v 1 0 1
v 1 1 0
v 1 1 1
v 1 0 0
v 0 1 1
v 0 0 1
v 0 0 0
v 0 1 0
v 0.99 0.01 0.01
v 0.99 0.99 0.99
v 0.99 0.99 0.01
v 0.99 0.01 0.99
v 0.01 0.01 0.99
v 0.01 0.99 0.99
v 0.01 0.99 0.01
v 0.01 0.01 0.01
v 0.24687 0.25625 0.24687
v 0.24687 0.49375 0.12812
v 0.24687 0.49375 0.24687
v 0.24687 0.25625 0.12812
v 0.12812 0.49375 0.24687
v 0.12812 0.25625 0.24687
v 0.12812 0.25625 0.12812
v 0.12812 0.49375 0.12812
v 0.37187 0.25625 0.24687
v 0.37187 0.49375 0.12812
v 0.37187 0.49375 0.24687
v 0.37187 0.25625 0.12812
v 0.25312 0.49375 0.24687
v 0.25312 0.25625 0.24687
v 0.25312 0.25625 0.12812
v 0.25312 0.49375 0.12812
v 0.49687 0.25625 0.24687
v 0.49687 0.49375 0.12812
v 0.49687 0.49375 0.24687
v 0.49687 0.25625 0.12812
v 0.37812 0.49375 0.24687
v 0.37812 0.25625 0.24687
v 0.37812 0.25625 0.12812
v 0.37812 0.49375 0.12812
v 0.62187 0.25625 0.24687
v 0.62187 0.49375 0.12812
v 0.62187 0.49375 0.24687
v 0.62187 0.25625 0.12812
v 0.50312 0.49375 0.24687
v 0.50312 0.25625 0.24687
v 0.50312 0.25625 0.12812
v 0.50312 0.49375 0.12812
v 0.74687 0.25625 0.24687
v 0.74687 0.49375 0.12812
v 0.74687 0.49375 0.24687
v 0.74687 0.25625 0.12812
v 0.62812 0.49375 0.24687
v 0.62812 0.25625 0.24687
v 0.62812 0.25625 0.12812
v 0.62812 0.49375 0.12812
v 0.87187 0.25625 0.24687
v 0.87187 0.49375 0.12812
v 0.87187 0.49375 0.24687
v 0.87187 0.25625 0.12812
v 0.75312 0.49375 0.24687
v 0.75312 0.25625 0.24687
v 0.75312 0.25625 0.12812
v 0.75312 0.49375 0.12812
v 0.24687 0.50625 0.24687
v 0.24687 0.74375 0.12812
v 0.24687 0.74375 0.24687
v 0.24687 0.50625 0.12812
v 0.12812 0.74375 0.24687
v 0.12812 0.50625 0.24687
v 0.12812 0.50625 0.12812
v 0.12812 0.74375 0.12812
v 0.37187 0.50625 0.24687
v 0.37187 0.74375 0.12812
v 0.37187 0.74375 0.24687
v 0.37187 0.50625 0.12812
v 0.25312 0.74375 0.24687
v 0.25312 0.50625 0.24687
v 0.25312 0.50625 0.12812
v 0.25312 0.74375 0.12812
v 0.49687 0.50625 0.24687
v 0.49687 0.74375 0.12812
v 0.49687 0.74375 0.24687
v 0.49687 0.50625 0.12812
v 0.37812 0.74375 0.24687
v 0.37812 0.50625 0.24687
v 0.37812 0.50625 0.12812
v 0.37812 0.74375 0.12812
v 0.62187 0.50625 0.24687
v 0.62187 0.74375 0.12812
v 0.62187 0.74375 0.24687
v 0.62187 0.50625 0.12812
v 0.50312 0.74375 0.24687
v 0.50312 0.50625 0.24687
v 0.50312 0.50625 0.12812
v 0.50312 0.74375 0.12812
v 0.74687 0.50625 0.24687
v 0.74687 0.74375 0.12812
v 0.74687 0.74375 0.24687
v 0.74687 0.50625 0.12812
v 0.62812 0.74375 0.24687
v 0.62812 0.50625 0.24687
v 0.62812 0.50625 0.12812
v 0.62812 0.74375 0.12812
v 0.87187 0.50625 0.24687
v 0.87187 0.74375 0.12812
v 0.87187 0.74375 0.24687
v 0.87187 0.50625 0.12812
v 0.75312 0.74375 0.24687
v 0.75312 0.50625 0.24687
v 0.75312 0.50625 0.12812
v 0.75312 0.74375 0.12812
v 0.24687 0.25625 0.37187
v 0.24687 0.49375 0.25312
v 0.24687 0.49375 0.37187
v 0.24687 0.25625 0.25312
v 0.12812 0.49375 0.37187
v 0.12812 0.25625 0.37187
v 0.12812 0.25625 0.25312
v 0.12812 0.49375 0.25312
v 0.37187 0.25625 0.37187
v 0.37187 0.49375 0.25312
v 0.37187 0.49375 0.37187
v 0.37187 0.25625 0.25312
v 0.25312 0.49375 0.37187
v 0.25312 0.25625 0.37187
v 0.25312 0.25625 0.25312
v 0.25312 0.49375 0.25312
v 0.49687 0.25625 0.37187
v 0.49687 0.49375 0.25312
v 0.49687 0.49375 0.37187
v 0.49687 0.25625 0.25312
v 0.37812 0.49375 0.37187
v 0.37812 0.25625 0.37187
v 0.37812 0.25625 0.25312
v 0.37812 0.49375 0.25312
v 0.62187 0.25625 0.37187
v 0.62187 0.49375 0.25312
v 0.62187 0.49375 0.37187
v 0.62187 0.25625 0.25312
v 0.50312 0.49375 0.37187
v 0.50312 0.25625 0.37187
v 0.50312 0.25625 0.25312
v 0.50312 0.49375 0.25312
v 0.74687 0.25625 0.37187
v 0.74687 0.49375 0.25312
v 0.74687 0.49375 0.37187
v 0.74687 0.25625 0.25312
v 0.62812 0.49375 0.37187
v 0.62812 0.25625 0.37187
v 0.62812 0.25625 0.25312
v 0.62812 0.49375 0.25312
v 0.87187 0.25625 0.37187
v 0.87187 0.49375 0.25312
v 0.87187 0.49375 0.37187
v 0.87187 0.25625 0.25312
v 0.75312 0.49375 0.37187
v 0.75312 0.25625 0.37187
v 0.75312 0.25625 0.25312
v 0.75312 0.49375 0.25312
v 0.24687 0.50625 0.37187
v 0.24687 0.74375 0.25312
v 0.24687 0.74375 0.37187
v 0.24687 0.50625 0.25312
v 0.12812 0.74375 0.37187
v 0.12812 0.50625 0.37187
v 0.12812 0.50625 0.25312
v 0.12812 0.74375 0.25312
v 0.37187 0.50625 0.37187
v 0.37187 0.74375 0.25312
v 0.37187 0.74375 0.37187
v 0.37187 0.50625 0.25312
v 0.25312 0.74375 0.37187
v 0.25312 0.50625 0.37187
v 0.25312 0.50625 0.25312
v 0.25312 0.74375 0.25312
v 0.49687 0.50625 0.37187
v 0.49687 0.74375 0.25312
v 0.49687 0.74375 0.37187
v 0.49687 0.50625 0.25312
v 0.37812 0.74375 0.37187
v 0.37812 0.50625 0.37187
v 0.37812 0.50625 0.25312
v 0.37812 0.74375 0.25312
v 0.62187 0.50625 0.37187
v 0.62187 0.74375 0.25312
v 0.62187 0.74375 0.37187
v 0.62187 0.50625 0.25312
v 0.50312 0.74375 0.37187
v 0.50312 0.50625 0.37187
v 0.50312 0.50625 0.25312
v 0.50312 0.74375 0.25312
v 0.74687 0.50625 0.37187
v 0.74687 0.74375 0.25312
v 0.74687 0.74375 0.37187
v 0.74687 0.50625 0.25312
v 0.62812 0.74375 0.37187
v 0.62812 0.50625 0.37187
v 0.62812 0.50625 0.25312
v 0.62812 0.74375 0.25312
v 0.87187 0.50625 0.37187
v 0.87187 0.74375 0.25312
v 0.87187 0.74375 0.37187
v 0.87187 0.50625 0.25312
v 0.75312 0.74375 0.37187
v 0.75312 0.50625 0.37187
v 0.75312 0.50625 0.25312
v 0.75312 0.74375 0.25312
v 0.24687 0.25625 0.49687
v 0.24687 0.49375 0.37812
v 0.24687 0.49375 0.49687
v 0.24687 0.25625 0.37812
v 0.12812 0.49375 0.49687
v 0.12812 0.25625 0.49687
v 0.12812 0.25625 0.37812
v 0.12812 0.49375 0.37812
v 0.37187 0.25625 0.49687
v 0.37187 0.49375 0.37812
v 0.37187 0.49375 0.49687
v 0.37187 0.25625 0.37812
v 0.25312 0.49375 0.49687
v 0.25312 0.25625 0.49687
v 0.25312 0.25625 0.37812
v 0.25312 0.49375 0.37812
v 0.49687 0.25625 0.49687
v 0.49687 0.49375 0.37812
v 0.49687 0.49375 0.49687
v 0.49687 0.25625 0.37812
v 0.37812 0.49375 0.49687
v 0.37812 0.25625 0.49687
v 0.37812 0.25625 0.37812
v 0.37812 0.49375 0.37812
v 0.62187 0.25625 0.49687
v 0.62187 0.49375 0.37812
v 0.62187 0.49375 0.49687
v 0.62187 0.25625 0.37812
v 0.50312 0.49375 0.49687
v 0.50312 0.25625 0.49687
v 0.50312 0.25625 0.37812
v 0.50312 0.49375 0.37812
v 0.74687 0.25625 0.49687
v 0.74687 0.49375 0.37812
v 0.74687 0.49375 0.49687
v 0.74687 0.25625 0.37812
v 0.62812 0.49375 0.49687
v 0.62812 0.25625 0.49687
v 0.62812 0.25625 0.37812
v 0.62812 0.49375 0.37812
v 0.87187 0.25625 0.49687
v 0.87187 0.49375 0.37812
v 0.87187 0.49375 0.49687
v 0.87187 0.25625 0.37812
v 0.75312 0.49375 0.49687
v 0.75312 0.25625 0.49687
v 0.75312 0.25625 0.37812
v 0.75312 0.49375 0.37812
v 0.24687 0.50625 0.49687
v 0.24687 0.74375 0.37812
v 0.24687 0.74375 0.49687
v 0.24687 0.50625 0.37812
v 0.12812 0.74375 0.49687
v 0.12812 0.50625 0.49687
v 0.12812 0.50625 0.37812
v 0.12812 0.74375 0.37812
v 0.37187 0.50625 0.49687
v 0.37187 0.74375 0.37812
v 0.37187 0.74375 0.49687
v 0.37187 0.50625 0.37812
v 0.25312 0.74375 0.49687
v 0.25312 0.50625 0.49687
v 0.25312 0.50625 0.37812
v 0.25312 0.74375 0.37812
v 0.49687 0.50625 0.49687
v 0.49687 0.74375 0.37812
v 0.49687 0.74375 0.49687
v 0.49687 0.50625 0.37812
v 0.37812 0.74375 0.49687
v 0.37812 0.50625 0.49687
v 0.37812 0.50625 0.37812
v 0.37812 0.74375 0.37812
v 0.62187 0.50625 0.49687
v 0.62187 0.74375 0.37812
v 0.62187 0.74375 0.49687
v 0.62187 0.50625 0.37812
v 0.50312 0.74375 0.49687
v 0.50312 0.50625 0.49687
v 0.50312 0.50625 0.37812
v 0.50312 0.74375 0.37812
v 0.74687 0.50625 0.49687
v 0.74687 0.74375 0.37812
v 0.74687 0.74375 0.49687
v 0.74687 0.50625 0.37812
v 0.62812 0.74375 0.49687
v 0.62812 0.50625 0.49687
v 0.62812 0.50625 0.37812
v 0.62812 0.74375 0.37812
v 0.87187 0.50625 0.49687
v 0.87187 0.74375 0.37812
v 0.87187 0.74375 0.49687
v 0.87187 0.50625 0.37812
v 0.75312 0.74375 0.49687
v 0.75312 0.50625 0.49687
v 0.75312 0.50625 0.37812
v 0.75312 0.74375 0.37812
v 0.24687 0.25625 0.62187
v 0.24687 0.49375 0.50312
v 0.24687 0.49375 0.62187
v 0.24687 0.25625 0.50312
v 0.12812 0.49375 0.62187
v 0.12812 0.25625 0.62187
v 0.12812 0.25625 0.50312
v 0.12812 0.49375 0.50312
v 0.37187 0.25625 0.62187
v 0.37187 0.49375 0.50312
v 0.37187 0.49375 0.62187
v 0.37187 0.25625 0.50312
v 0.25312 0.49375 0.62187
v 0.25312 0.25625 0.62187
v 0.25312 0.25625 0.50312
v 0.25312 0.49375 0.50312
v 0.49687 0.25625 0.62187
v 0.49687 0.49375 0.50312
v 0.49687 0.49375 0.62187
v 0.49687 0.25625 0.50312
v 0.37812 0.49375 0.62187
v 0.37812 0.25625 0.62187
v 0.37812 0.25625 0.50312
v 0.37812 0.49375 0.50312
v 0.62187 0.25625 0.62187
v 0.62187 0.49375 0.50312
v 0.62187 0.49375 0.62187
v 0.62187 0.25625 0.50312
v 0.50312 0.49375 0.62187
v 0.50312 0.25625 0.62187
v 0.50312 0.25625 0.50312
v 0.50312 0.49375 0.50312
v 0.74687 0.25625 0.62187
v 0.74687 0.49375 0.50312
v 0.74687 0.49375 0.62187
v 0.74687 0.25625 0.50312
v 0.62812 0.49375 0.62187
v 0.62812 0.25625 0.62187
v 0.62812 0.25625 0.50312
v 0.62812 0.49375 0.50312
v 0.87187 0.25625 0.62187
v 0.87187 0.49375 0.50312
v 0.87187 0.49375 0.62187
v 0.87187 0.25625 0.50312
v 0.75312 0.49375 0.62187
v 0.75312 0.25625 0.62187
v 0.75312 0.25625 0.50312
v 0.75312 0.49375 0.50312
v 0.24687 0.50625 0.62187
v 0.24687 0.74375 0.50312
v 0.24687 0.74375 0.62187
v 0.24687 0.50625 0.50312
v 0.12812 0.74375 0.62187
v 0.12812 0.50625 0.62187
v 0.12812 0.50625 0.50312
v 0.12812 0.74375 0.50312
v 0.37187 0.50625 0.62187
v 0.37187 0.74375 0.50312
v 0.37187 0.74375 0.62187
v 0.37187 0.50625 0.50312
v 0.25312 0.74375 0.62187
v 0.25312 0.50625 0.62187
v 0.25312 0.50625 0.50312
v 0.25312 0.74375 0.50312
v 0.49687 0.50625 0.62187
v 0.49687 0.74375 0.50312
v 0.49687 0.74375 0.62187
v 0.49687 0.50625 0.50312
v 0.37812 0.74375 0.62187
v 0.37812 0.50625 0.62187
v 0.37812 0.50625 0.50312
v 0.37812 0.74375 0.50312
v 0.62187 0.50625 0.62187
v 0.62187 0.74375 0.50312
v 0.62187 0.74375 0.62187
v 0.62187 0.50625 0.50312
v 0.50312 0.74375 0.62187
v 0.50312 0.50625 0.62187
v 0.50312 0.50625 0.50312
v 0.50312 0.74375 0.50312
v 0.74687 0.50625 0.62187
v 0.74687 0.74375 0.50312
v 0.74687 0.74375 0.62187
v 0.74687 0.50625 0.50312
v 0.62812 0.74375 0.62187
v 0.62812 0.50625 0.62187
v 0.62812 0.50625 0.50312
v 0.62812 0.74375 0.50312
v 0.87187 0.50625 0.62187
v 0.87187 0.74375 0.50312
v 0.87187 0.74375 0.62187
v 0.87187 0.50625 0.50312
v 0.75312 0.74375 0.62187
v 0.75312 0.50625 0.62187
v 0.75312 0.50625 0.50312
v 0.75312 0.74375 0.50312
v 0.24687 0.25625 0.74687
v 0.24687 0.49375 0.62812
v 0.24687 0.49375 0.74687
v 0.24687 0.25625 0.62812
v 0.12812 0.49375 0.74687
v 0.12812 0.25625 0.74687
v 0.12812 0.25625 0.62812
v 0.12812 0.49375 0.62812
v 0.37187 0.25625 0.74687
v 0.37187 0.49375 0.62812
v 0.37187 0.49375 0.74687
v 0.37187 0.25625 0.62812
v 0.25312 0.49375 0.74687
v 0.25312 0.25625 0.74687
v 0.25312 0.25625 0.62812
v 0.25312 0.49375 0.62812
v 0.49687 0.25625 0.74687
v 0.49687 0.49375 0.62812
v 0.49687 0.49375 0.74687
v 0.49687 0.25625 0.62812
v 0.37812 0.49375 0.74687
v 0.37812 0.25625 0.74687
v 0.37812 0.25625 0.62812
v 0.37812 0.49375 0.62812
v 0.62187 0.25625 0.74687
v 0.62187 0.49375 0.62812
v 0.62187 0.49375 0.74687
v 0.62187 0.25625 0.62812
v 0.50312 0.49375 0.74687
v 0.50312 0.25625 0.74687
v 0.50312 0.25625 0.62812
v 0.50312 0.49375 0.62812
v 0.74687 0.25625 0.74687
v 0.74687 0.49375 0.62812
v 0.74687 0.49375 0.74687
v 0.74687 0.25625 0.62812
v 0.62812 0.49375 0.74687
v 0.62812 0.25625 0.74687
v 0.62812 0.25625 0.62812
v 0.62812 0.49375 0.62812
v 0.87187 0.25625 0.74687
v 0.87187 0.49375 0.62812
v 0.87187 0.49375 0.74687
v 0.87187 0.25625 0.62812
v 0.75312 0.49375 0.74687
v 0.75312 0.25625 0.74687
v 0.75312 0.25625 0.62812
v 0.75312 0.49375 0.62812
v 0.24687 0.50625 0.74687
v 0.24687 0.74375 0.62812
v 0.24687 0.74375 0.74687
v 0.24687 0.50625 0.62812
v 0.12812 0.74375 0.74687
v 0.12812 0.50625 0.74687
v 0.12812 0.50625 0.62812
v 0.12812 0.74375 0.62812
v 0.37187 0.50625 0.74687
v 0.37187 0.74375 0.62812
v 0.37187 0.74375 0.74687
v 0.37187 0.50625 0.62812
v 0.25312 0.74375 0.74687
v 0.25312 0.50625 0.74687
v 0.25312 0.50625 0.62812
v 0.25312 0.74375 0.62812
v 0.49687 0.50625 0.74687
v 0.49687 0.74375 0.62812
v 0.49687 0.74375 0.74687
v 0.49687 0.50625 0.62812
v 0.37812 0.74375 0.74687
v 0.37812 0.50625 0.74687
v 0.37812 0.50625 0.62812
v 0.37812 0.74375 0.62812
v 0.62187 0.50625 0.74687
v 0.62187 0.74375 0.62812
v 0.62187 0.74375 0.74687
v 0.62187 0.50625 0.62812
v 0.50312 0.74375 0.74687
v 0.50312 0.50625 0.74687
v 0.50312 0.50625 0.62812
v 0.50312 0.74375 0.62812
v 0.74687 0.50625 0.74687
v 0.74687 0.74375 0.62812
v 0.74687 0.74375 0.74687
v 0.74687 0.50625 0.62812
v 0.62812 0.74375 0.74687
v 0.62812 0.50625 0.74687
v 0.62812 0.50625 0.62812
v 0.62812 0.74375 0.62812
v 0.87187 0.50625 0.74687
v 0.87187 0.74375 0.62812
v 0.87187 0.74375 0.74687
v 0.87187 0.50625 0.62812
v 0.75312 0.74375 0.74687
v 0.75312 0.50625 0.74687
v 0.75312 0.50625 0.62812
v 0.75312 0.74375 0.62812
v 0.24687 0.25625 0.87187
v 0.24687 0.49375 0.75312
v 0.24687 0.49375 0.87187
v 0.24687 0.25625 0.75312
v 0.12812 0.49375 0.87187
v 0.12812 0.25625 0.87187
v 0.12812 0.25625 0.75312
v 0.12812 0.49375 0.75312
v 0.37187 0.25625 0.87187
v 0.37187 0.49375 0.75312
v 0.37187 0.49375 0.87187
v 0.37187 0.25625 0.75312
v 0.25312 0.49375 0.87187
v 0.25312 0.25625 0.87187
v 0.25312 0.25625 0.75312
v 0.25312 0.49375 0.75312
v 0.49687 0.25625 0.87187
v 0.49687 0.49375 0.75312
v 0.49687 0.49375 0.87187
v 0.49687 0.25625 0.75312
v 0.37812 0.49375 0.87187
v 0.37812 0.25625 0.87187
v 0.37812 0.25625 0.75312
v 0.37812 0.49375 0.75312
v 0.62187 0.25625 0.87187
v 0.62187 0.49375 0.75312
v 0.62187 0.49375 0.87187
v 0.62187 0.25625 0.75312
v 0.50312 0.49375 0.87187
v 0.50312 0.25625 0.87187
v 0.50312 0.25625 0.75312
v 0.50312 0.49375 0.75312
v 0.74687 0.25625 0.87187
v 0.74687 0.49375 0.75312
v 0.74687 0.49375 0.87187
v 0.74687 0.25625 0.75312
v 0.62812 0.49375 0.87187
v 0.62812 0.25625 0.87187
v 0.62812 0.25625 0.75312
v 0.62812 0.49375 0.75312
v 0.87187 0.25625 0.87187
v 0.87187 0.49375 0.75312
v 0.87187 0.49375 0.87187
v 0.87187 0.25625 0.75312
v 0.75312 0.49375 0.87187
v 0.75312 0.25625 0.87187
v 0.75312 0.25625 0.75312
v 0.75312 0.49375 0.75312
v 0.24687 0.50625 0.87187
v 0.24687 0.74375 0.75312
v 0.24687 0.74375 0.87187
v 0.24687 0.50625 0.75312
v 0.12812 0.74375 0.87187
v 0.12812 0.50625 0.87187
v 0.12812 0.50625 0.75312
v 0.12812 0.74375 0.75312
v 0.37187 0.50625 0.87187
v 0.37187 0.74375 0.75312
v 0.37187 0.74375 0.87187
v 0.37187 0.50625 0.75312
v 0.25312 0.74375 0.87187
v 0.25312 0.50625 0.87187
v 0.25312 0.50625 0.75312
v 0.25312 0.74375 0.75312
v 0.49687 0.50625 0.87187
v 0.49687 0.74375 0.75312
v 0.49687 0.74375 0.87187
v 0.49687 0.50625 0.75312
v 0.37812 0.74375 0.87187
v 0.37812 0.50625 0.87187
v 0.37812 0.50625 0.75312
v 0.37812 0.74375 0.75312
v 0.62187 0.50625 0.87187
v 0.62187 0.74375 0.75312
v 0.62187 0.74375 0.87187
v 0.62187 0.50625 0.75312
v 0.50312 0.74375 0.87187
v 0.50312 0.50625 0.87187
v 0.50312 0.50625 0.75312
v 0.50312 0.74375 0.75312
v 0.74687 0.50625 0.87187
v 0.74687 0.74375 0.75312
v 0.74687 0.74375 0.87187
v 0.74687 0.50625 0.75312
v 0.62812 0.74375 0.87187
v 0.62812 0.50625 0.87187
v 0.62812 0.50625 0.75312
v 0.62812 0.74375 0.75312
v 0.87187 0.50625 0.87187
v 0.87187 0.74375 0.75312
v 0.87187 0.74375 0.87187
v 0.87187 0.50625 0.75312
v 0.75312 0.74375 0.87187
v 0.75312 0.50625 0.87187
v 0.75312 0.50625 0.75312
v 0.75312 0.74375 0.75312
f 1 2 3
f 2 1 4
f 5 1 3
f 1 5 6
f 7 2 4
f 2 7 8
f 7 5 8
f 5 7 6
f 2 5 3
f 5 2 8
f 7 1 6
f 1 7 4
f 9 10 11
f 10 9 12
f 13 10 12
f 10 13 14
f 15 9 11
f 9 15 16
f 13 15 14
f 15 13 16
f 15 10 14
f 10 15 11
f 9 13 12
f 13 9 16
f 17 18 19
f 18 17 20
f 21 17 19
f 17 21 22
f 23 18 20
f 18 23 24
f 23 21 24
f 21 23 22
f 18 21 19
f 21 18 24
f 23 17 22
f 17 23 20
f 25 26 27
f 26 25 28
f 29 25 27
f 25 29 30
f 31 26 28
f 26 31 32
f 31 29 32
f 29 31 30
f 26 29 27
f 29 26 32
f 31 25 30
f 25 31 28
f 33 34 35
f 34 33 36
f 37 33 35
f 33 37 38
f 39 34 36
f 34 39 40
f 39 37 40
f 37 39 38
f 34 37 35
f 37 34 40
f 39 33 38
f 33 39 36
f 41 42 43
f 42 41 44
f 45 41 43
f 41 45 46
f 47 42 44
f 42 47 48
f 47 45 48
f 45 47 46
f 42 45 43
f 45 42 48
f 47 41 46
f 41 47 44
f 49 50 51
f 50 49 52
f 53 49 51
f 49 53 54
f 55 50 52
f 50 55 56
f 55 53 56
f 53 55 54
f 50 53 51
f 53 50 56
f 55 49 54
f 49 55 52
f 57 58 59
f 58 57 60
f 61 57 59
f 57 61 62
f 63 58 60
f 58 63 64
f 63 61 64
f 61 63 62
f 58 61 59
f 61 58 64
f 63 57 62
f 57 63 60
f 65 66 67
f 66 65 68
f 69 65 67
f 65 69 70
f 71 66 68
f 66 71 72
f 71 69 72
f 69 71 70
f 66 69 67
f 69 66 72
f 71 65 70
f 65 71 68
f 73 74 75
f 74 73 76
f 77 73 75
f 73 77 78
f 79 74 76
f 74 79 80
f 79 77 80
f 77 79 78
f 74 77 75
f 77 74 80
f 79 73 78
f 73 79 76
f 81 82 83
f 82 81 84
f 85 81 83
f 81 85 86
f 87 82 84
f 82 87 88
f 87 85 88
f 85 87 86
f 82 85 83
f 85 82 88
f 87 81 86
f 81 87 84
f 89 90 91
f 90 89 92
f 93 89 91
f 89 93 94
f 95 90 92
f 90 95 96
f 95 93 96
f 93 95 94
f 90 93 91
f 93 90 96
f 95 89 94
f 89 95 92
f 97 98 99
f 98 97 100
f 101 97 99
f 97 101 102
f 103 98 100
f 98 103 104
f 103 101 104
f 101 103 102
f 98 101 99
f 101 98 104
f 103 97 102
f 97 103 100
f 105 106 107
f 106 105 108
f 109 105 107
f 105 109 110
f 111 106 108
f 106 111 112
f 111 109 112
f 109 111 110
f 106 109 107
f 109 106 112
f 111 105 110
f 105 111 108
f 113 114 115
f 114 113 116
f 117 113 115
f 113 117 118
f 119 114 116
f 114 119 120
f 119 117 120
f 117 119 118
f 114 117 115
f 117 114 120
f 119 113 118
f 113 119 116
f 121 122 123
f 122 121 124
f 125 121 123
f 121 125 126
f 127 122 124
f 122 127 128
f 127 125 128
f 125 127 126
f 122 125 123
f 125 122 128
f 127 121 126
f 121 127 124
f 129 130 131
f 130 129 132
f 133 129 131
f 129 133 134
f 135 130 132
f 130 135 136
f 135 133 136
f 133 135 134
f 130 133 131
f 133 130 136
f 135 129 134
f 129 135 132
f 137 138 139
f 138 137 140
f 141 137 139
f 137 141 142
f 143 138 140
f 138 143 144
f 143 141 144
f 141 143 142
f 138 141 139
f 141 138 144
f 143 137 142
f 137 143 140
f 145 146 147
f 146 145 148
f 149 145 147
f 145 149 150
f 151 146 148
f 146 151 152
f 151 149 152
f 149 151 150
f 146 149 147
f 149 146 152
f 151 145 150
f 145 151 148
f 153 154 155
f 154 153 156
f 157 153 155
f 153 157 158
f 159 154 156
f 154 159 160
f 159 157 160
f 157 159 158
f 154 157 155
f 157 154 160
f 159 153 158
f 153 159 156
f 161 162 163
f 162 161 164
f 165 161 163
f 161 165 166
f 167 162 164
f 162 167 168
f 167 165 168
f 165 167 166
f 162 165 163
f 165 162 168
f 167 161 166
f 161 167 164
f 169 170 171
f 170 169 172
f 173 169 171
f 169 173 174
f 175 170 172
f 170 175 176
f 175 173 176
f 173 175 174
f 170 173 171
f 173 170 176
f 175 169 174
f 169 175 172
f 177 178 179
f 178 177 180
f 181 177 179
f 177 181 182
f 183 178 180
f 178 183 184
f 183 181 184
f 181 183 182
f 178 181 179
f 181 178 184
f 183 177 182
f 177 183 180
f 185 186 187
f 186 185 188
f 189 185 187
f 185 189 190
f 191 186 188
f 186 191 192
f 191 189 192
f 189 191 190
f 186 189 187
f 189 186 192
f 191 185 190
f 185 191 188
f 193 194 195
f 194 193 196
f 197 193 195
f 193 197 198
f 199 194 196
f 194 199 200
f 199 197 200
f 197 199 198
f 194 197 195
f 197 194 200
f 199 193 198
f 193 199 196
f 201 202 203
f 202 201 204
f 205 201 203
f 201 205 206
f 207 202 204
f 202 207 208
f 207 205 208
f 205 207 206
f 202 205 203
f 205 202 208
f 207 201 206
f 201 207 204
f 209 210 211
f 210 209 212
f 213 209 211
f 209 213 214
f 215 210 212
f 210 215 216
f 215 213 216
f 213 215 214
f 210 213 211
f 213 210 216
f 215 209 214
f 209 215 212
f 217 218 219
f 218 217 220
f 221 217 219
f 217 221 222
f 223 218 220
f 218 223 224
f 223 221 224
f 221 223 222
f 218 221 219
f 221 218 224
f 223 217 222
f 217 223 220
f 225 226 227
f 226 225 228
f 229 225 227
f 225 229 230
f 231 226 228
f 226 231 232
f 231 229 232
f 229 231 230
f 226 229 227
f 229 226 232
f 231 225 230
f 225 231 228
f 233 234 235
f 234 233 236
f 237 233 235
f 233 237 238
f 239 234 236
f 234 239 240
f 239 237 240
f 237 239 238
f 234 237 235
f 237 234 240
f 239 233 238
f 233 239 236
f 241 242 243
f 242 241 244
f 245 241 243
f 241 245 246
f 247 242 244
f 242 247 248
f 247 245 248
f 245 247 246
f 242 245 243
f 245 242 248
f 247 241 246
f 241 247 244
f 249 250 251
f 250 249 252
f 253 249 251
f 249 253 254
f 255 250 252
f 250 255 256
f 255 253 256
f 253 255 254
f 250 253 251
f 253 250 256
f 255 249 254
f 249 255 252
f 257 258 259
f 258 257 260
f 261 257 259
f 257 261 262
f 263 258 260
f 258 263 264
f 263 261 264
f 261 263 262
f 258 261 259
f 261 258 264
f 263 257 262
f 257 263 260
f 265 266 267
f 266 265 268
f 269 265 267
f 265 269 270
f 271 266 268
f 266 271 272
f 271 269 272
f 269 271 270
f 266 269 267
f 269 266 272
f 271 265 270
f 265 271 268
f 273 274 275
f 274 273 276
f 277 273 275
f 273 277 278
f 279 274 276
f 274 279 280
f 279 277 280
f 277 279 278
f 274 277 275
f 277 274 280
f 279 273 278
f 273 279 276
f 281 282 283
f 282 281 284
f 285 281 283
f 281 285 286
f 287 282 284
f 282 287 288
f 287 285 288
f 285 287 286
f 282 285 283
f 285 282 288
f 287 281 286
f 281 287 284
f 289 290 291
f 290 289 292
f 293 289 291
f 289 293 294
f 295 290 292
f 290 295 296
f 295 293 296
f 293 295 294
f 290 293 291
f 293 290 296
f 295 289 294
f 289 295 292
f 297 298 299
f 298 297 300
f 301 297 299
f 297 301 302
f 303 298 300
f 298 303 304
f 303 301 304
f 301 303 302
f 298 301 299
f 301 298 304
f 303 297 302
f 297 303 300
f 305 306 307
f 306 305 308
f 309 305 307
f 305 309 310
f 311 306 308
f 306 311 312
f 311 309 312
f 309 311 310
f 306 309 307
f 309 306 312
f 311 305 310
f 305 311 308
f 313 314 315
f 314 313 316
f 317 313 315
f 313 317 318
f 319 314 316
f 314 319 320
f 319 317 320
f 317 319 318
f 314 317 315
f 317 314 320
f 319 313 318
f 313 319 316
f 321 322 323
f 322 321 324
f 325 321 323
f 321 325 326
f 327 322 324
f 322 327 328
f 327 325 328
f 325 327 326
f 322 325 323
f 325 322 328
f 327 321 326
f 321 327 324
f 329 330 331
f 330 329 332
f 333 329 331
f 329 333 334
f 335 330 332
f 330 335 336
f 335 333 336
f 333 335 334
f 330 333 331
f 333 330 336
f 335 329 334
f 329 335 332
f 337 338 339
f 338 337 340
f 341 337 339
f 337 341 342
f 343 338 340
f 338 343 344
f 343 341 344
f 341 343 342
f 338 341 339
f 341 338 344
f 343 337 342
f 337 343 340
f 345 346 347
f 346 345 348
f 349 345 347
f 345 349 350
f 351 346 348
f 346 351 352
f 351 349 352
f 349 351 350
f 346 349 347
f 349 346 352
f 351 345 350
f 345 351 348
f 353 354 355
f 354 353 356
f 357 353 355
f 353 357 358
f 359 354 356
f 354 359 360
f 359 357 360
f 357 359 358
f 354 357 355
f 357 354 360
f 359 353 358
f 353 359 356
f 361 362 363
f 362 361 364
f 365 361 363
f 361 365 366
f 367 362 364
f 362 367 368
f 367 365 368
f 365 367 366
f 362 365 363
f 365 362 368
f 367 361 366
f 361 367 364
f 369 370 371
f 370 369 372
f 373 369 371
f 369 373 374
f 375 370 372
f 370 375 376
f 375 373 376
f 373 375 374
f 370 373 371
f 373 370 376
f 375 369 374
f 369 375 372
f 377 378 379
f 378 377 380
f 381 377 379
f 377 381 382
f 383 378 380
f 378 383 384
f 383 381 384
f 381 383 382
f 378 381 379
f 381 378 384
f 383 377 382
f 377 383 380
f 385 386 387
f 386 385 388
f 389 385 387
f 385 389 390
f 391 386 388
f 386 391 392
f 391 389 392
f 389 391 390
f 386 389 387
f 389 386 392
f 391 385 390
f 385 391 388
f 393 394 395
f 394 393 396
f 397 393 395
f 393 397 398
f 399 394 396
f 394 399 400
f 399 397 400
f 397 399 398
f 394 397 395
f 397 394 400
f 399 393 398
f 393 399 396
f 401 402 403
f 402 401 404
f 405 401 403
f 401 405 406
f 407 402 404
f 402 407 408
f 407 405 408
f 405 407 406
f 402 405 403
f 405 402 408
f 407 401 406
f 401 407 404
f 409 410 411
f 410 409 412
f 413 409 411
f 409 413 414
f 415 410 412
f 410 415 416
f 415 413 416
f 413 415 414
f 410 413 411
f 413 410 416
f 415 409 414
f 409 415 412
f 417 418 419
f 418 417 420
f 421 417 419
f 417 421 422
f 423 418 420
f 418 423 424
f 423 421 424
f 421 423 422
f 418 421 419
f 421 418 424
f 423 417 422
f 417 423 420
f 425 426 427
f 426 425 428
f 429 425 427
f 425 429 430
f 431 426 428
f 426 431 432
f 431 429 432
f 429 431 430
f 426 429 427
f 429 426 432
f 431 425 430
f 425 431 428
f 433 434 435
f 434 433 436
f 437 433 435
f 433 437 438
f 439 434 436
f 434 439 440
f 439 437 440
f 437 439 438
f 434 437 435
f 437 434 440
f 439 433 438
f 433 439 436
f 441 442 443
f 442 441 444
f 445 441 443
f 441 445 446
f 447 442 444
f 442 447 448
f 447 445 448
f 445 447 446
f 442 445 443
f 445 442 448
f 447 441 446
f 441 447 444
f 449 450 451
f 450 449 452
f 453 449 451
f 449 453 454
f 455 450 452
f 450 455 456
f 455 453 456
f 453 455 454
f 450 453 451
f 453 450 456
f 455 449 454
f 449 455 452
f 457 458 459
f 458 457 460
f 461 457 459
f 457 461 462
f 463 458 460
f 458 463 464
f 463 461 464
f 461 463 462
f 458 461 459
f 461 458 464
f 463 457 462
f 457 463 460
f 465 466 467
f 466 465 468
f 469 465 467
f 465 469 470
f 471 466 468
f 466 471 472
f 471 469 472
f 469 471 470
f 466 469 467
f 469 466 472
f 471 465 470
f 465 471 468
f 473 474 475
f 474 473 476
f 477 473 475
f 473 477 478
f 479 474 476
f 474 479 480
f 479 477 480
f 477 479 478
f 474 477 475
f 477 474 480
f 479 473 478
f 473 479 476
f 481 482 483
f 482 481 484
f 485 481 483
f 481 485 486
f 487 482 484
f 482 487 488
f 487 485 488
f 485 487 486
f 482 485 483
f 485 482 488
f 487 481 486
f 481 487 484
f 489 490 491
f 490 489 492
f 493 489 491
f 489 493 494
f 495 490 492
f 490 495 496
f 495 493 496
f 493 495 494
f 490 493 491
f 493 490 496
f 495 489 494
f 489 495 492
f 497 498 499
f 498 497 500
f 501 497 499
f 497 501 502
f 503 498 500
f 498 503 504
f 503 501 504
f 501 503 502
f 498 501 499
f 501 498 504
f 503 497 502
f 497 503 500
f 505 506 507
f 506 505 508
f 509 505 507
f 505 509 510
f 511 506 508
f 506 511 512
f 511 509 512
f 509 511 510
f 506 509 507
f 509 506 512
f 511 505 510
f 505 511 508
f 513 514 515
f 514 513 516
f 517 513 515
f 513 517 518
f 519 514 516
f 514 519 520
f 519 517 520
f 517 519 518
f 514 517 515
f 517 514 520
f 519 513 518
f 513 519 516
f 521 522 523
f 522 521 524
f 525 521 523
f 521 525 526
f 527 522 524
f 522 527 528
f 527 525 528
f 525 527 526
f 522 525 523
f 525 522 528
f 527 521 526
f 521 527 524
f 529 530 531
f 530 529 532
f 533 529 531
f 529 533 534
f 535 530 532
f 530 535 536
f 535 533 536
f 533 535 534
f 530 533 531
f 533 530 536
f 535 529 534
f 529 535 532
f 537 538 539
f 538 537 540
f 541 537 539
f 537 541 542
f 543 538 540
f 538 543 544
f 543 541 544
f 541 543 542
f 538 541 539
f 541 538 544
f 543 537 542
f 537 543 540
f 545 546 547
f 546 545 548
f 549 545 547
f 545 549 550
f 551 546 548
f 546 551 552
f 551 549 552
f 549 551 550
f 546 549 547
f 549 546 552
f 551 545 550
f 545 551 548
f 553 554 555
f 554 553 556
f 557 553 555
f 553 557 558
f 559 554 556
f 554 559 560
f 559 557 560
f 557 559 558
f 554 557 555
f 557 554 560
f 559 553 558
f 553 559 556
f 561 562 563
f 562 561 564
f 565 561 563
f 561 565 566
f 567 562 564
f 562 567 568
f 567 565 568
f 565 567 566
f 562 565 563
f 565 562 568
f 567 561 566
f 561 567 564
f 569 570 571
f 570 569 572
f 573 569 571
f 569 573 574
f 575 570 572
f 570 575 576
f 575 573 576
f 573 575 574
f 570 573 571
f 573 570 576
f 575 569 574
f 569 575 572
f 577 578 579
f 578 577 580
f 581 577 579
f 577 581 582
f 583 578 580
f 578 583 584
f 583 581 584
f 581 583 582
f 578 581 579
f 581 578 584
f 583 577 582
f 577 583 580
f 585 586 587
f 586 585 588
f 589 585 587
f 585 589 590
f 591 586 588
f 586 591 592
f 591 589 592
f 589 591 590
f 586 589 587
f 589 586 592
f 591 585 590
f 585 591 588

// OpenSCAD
translate([0.1875, 0.375, 0.1875]) color([0.3519350680925015, 0.6477014615427978, 0.14125726454845833]) cube([0.11875, 0.2375, 0.11875], center=true);
translate([0.3125, 0.375, 0.1875]) color([0.23013900541024712, 0.8285218163248013, 0.9603761550286747]) cube([0.11875, 0.2375, 0.11875], center=true);
translate([0.4375, 0.375, 0.1875]) color([0.6050710034948523, 0.017553655236826726, 0.43262871278032167]) cube([0.11875, 0.2375, 0.11875], center=true);
translate([0.5625, 0.375, 0.1875]) color([0.2571490251669072, 0.4480229944680496, 0.14517873337393172]) cube([0.11875, 0.2375, 0.11875], center=true);
translate([0.6875, 0.375, 0.1875]) color([0.8405131005933094, 0.9776834869331054, 0.10300019528175153]) cube([0.11875, 0.2375, 0.11875], center=true);
translate([0.8125, 0.375, 0.1875]) color([0.998153073210626, 0.8535026464000083, 0.6855970549077809]) cube([0.11875, 0.2375, 0.11875], center=true);
translate([0.1875, 0.625, 0.1875]) color([0.7995005100691247, 0.34047238184459006, 0.1286635278612125]) cube([0.11875, 0.2375, 0.11875], center=true);
translate([0.3125, 0.625, 0.1875]) color([0.6020598448119898, 0.9167847797194366, 0.02081986636819022]) cube([0.11875, 0.2375, 0.11875], center=true);
translate([0.4375, 0.625, 0.1875]) color([0.9135118305629362, 0.3823609034395232, 0.42581309278619206]) cube([0.11875, 0.2375, 0.11875], center=true);
translate([0.5625, 0.625, 0.1875]) color([0.08967296065919184, 0.0016857337534631478, 0.31287848776698257]) cube([0.11875, 0.2375, 0.11875], center=true);
translate([0.6875, 0.625, 0.1875]) color([0.09731792302828757, 0.364404074066101, 0.8754307508322564]) cube([0.11875, 0.2375, 0.11875], center=true);
translate([0.8125, 0.625, 0.1875]) color([0.6967090939923642, 0.5776053806129825, 0.18685318159950626]) cube([0.11875, 0.2375, 0.11875], center=true);
translate([0.1875, 0.375, 0.3125]) color([0.9585806736472646, 0.593334846568766, 0.09927504601217696]) cube([0.11875, 0.2375, 0.11875], center=true);
translate([0.3125, 0.375, 0.3125]) color([0.19313665173925, 0.6863688301261038, 0.2093263356404984]) cube([0.11875, 0.2375, 0.11875], center=true);
translate([0.4375, 0.375, 0.3125]) color([0.2694340379225941, 0.24598969558588324, 0.16092298384524362]) cube([0.11875, 0.2375, 0.11875], center=true);
translate([0.5625, 0.375, 0.3125]) color([0.5102606956149307, 0.431705445139412, 0.38909399282504675]) cube([0.11875, 0.2375, 0.11875], center=true);
translate([0.6875, 0.375, 0.3125]) color([0.3194819673674283, 0.6655357355223767, 0.22692357675811492]) cube([0.11875, 0.2375, 0.11875], center=true);
translate([0.8125, 0.375, 0.3125]) color([0.9464906820257937, 0.35776616524050997, 0.9421064453260054]) cube([0.11875, 0.2375, 0.11875], center=true);
translate([0.1875, 0.625, 0.3125]) color([0.3792404853118415, 0.27508202782836655, 0.9368074710650367]) cube([0.11875, 0.2375, 0.11875], center=true);
translate([0.3125, 0.625, 0.3125]) color([0.7670397757471089, 0.17483880300164423, 0.7474114244696689]) cube([0.11875, 0.2375, 0.11875], center=true);
translate([0.4375, 0.625, 0.3125]) color([0.6015236368594579, 0.5872808850844162, 0.28390336255679416]) cube([0.11875, 0.2375, 0.11875], center=true);
translate([0.5625, 0.625, 0.3125]) color([0.5839405385485582, 0.4048698908705002, 0.6877557316706271]) cube([0.11875, 0.2375, 0.11875], center=true);
translate([0.6875, 0.625, 0.3125]) color([0.29310936231965135, 0.08456113000314536, 0.6409271470126323]) cube([0.11875, 0.2375, 0.11875], center=true);
translate([0.8125, 0.625, 0.3125]) color([0.38512246522478266, 0.6162859510128613, 0.407224705538046]) cube([0.11875, 0.2375, 0.11875], center=true);
translate([0.1875, 0.375, 0.4375]) color([0.6107800780239486, 0.9541913078580654, 0.09369719926319908]) cube([0.11875, 0.2375, 0.11875], center=true);
translate([0.3125, 0.375, 0.4375]) color([0.4396226851829427, 0.9817497074141792, 0.30111933510979894]) cube([0.11875, 0.2375, 0.11875], center=true);
translate([0.4375, 0.375, 0.4375]) color([0.08571041628526821, 0.691130580335744, 0.16573157374072334]) cube([0.11875, 0.2375, 0.11875], center=true);
translate([0.5625, 0.375, 0.4375]) color([0.4668304924867862, 0.30100213617539295, 0.3511677492745029]) cube([0.11875, 0.2375, 0.11875], center=true);
translate([0.6875, 0.375, 0.4375]) color([0.05564944269037686, 0.7696481469448815, 0.686275624239137]) cube([0.11875, 0.2375, 0.11875], center=true);
translate([0.8125, 0.375, 0.4375]) color([0.15447252119296884, 0.35335085758162643, 0.18799175914388588]) cube([0.11875, 0.2375, 0.11875], center=true);
translate([0.1875, 0.625, 0.4375]) color([0.41322879780265653, 0.82270842281296, 0.9057146612667819]) cube([0.11875, 0.2375, 0.11875], center=true);
translate([0.3125, 0.625, 0.4375]) color([0.9688547633127277, 0.5528378273263655, 0.12760284187612392]) cube([0.11875, 0.2375, 0.11875], center=true);
translate([0.4375, 0.625, 0.4375]) color([0.1710979555253146, 0.7131998843266452, 0.6397779425125977]) cube([0.11875, 0.2375, 0.11875], center=true);
translate([0.5625, 0.625, 0.4375]) color([0.57496968906483, 0.8489371230716904, 0.07944838941339594]) cube([0.11875, 0.2375, 0.11875], center=true);
translate([0.6875, 0.625, 0.4375]) color([0.040333123224873146, 0.9305910632054132, 0.3080440975445232]) cube([0.11875, 0.2375, 0.11875], center=true);
translate([0.8125, 0.625, 0.4375]) color([0.6084655882345898, 0.4923441190446234, 0.7069385087242315]) cube([0.11875, 0.2375, 0.11875], center=true);
translate([0.1875, 0.375, 0.5625]) color([0.6803385961846494, 0.18024793645131376, 0.10787678186317007]) cube([0.11875, 0.2375, 0.11875], center=true);
translate([0.3125, 0.375, 0.5625]) color([0.1335624130282893, 0.47731112778056706, 0.8393950916733898]) cube([0.11875, 0.2375, 0.11875], center=true);
translate([0.4375, 0.375, 0.5625]) color([0.6780893207968227, 0.08337096158279222, 0.27725115680544954]) cube([0.11875, 0.2375, 0.11875], center=true);
translate([0.5625, 0.375, 0.5625]) color([0.9965791662073833, 0.03375154870506614, 0.10494976972159242]) cube([0.11875, 0.2375, 0.11875], center=true);
translate([0.6875, 0.375, 0.5625]) color([0.516844917539197, 0.1360610465034362, 0.543805910213663]) cube([0.11875, 0.2375, 0.11875], center=true);
translate([0.8125, 0.375, 0.5625]) color([0.04901628196141694, 0.4867102513994055, 0.8813892002857401]) cube([0.11875, 0.2375, 0.11875], center=true);
translate([0.1875, 0.625, 0.5625]) color([0.3053751014353143, 0.40772022041766365, 0.31297204198076634]) cube([0.11875, 0.2375, 0.11875], center=true);
translate([0.3125, 0.625, 0.5625]) color([0.49907796034366436, 0.6160709555012981, 0.9916538905911245]) cube([0.11875, 0.2375, 0.11875], center=true);
translate([0.4375, 0.625, 0.5625]) color([0.3123575451593331, 0.46364206475662195, 0.8862899719975306]) cube([0.11875, 0.2375, 0.11875], center=true);
translate([0.5625, 0.625, 0.5625]) color([0.5738800220993816, 0.8494037217359881, 0.24323676398212035]) cube([0.11875, 0.2375, 0.11875], center=true);
translate([0.6875, 0.625, 0.5625]) color([0.8402878098664139, 0.9530478541805099, 0.16594803365564914]) cube([0.11875, 0.2375, 0.11875], center=true);
translate([0.8125, 0.625, 0.5625]) color([0.0023370868964924796, 0.7387895340607371, 0.5374530602666081]) cube([0.11875, 0.2375, 0.11875], center=true);
translate([0.1875, 0.375, 0.6875]) color([0.25604025835089217, 0.4320068924153808, 0.5112453323210508]) cube([0.11875, 0.2375, 0.11875], center=true);
translate([0.3125, 0.375, 0.6875]) color([0.7462272619347637, 0.5039790716190428, 0.8850839351693509]) cube([0.11875, 0.2375, 0.11875], center=true);
translate([0.4375, 0.375, 0.6875]) color([0.6652757233710683, 0.22263754843686523, 0.08942086350367451]) cube([0.11875, 0.2375, 0.11875], center=true);
translate([0.5625, 0.375, 0.6875]) color([0.6195232841458308, 0.9036720387350747, 0.7222923954673625]) cube([0.11875, 0.2375, 0.11875], center=true);
translate([0.6875, 0.375, 0.6875]) color([0.6665075097113882, 0.5421139713900744, 0.6943978877819516]) cube([0.11875, 0.2375, 0.11875], center=true);
translate([0.8125, 0.375, 0.6875]) color([0.9269770591996176, 0.12480324665016229, 0.8422397758241813]) cube([0.11875, 0.2375, 0.11875], center=true);
translate([0.1875, 0.625, 0.6875]) color([0.028249143050612435, 0.8554899328562455, 0.6212809598996976]) cube([0.11875, 0.2375, 0.11875], center=true);
translate([0.3125, 0.625, 0.6875]) color([0.6435486749275994, 0.4857227915978113, 0.2898251547629681]) cube([0.11875, 0.2375, 0.11875], center=true);
translate([0.4375, 0.625, 0.6875]) color([0.21709076393122206, 0.4979948584580751, 0.6176241526046676]) cube([0.11875, 0.2375, 0.11875], center=true);
translate([0.5625, 0.625, 0.6875]) color([0.4722249532281336, 0.7228331534363125, 0.6109414561657331]) cube([0.11875, 0.2375, 0.11875], center=true);
translate([0.6875, 0.625, 0.6875]) color([0.5330085163671737, 0.6769359871291822, 0.5973748769978083]) cube([0.11875, 0.2375, 0.11875], center=true);
translate([0.8125, 0.625, 0.6875]) color([0.14460255854654236, 0.21273280877313017, 0.8417179364881341]) cube([0.11875, 0.2375, 0.11875], center=true);
translate([0.1875, 0.375, 0.8125]) color([0.6300391880279899, 0.5103677782275869, 0.4479627161837708]) cube([0.11875, 0.2375, 0.11875], center=true);
translate([0.3125, 0.375, 0.8125]) color([0.2903518628620462, 0.1744676713524972, 0.5457372127765215]) cube([0.11875, 0.2375, 0.11875], center=true);
translate([0.4375, 0.375, 0.8125]) color([0.6340658375422632, 0.7004271366493812, 0.690956934786038]) cube([0.11875, 0.2375, 0.11875], center=true);
translate([0.5625, 0.375, 0.8125]) color([0.013948469234104865, 0.8018456354370093, 0.2607079205191076]) cube([0.11875, 0.2375, 0.11875], center=true);
translate([0.6875, 0.375, 0.8125]) color([0.01899716010339858, 0.7507132946374245, 0.44168653561511173]) cube([0.11875, 0.2375, 0.11875], center=true);
translate([0.8125, 0.375, 0.8125]) color([0.1668653701245908, 0.45955837321901094, 0.7876756969907556]) cube([0.11875, 0.2375, 0.11875], center=true);
translate([0.1875, 0.625, 0.8125]) color([0.09564527702692727, 0.06733136152719421, 0.7816649665975636]) cube([0.11875, 0.2375, 0.11875], center=true);
translate([0.3125, 0.625, 0.8125]) color([0.030385075649315252, 0.33346286891595733, 0.08647112242809318]) cube([0.11875, 0.2375, 0.11875], center=true);
translate([0.4375, 0.625, 0.8125]) color([0.8161439782233904, 0.05657658467482607, 0.8243668117903717]) cube([0.11875, 0.2375, 0.11875], center=true);
translate([0.5625, 0.625, 0.8125]) color([0.05808931884644186, 0.6181904095369413, 0.1426995958976538]) cube([0.11875, 0.2375, 0.11875], center=true);
translate([0.6875, 0.625, 0.8125]) color([0.3846464495954227, 0.3794414211645075, 0.7643773332264734]) cube([0.11875, 0.2375, 0.11875], center=true);
translate([0.8125, 0.625, 0.8125]) color([0.3116889002403487, 0.7690158776827113, 0.7674729074453902]) cube([0.11875, 0.2375, 0.11875], center=true);
color([0.3,0.3,0.3,0.3]) difference() { cube([1,1,1]); translate([0.01,0.01,0.01]) cube([0.98,0.98,0.98]); }
